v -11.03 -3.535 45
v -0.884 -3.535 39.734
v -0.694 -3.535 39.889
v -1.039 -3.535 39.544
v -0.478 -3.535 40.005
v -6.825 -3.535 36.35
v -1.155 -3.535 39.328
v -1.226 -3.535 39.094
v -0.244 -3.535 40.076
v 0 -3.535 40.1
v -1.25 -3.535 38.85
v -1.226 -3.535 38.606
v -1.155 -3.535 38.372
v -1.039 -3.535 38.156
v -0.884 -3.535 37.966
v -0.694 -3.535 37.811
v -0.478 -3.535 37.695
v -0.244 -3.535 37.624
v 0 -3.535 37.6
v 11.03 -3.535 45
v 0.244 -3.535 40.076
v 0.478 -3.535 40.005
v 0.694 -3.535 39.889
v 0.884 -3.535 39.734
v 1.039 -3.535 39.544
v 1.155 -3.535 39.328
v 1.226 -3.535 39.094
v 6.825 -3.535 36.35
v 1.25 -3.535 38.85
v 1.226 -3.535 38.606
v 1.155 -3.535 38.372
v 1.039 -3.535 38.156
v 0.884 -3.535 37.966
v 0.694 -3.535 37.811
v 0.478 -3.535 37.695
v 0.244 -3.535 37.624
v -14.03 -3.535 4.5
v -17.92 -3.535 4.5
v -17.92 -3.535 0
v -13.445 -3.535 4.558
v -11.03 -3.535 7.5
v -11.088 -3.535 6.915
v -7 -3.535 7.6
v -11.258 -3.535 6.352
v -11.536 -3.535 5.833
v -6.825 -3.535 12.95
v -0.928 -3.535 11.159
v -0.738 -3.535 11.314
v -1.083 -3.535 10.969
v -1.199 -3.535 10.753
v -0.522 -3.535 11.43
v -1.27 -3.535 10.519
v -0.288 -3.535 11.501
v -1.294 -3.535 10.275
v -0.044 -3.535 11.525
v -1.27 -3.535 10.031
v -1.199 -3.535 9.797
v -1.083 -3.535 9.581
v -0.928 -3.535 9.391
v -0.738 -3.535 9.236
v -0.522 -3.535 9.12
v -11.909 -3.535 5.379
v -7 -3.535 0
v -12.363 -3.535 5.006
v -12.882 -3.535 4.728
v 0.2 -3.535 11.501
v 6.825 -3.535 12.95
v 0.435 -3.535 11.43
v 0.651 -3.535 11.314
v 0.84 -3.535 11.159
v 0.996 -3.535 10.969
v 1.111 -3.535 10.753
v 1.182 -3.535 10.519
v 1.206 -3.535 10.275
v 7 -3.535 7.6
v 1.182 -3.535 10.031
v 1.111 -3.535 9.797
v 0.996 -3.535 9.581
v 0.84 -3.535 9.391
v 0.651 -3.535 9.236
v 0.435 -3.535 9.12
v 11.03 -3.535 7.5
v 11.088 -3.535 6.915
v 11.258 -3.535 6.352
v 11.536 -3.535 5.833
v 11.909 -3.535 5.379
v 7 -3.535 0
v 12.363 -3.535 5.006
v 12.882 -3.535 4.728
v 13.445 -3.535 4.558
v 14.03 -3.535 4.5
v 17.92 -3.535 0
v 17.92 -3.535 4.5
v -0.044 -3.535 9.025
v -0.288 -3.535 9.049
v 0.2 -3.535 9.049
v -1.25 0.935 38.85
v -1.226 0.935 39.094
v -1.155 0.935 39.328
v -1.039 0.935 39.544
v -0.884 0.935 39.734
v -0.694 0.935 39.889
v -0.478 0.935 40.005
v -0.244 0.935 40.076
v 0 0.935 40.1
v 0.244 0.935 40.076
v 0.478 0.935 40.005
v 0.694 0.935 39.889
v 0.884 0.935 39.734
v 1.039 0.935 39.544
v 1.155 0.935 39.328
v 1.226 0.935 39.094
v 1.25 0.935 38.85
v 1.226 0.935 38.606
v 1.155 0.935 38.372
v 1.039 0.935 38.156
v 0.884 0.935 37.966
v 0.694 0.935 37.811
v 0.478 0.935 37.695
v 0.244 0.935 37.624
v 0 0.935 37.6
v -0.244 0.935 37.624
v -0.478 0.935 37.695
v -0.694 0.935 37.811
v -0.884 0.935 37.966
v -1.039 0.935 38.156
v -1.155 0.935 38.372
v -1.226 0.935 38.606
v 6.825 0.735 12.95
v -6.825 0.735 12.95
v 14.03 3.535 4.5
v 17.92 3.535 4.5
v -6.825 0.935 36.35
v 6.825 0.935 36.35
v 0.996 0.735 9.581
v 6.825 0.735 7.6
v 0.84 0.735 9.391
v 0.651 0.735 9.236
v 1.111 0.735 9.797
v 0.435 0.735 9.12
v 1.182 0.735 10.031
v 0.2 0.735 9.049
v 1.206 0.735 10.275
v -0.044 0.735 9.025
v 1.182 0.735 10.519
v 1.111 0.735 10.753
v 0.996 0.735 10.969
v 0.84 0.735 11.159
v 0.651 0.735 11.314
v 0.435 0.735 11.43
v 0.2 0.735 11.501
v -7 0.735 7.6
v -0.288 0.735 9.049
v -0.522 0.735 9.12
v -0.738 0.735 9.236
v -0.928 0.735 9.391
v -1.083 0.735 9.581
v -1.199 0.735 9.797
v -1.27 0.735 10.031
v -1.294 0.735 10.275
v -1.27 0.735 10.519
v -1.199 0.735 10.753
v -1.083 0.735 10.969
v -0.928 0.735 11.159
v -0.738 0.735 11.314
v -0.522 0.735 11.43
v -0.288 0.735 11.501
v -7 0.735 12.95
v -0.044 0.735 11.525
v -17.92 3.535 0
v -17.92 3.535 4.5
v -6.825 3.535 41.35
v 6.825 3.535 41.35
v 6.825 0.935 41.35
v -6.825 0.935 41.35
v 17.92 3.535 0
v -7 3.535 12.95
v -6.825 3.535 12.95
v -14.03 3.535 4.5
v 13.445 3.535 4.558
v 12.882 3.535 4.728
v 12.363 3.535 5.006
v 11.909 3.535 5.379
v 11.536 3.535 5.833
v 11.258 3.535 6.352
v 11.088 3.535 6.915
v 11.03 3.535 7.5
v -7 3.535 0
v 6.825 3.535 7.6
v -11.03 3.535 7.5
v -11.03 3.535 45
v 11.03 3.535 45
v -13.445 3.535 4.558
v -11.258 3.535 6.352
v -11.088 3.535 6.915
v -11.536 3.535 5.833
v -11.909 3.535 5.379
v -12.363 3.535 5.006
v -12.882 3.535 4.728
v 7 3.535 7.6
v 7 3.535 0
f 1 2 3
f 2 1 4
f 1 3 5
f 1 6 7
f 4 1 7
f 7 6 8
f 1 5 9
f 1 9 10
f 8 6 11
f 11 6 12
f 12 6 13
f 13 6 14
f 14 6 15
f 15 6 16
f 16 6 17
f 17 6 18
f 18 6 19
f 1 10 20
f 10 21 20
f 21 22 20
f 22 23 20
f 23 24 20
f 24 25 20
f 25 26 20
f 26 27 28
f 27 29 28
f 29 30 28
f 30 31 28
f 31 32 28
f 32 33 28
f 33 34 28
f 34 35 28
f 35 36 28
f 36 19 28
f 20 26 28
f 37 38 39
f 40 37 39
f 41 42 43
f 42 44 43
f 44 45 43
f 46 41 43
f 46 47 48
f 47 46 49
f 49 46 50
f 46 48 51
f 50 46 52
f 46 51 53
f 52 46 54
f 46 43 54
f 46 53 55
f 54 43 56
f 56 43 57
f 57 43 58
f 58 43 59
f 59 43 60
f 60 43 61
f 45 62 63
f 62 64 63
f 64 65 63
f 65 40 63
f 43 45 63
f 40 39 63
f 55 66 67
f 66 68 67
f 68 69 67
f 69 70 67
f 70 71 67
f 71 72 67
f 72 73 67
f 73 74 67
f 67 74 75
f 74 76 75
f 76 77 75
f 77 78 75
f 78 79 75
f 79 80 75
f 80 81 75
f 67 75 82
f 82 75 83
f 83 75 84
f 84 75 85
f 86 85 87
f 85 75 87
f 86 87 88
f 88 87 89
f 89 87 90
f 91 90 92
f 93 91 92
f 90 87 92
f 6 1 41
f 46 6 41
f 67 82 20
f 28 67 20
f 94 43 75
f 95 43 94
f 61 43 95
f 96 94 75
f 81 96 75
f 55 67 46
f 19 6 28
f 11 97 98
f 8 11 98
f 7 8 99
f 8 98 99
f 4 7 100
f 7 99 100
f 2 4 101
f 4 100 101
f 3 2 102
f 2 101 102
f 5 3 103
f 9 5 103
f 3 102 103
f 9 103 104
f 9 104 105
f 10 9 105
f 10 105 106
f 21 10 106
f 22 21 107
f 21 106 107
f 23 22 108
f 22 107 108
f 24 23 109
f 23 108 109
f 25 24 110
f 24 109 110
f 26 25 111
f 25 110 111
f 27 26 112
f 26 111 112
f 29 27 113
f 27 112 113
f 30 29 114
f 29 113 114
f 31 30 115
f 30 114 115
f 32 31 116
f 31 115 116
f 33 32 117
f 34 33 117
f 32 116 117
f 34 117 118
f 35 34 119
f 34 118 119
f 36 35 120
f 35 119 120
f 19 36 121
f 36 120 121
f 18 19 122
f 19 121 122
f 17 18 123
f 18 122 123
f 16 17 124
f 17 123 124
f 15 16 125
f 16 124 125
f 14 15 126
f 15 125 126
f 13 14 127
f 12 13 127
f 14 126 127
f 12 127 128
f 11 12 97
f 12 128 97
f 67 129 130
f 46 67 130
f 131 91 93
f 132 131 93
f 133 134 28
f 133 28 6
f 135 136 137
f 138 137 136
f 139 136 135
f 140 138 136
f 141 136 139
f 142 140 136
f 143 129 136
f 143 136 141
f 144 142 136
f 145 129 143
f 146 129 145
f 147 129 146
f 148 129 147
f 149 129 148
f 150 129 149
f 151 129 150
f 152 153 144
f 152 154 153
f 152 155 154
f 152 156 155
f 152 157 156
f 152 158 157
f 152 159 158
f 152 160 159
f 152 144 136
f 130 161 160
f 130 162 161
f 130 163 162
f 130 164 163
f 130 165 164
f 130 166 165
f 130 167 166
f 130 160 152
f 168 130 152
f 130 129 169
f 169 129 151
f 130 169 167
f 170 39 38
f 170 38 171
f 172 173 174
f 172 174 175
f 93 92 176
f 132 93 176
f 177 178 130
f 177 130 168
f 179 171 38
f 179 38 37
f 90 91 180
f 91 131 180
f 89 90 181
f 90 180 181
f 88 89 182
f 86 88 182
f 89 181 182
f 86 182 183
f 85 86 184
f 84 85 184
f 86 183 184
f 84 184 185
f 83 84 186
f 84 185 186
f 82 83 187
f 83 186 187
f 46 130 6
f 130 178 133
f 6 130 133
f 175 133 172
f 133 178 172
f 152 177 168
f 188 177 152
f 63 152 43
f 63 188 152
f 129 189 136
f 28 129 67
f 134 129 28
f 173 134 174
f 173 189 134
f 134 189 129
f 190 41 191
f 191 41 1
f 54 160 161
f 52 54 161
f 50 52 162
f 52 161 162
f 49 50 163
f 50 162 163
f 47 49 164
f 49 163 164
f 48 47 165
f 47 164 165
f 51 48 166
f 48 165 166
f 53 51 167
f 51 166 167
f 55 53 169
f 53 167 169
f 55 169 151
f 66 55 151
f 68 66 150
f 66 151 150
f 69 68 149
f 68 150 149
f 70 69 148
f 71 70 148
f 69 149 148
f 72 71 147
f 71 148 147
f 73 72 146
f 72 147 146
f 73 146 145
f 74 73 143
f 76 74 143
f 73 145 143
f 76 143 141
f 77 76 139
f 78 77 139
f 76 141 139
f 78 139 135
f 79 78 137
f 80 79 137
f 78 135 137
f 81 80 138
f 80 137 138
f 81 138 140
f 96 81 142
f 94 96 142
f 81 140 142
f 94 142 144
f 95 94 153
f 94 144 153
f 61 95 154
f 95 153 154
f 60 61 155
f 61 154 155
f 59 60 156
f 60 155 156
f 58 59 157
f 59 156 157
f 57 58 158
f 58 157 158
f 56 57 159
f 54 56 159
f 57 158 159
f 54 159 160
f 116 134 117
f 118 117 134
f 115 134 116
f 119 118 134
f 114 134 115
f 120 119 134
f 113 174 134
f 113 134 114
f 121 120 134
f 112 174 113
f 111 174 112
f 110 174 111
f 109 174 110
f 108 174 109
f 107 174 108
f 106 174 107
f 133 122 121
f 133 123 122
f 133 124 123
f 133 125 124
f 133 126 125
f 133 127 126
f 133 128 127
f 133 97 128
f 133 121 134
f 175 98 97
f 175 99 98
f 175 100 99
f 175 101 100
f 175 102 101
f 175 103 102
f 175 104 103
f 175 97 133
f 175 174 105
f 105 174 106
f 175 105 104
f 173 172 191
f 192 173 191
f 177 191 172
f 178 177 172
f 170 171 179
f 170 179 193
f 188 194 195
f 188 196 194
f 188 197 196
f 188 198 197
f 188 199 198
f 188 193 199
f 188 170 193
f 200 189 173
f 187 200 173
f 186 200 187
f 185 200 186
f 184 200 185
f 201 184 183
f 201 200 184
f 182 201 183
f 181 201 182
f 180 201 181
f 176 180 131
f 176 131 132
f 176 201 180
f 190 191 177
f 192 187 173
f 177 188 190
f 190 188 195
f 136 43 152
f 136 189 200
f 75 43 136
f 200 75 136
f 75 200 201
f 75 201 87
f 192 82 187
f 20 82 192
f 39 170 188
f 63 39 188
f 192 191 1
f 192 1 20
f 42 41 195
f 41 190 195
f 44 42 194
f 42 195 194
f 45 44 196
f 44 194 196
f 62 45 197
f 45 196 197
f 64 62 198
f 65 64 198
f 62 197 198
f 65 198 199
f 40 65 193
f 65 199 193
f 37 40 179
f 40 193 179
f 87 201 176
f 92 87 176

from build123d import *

# Parameters (mm, degrees)
F0_W      = 35.84
F0_H      = 7.07
F1_DEPTH  = 45
F4_W      = 6.89
F4_H      = 40.5
F5_DEPTH  = 7.07
F6_W      = 6.89
F6_H      = 40.5
F7_DEPTH  = 7.07
F2_W      = 14
F2_H      = 7.07
F9_DEPTH  = 7.6
F10_W     = 13.65
F10_H     = 23.4
F11_DEPTH = 7.07
F12_W     = 13.65
F12_H     = 5
F13_DEPTH = 2.6
F14_W     = 13.825
F14_H     = 5.35
F15_DEPTH = 2.8
F16_R     = 3
F17_R     = 1.25
F18_DEPTH = 4.27
F19_R     = 1.25
F20_DEPTH = 4.47


with BuildPart() as f1:
    # F0 (on Top) → F1 (new body)
    with BuildSketch(Plane.XY):
        Rectangle(F0_W, F0_H)
    extrude(amount=F1_DEPTH)

    # F4 (on face) → F5 (cut, through all)
    with BuildSketch(Plane.XZ.offset(3.535)):
        with Locations((14.475, 24.75)):
            Rectangle(F4_W, F4_H)
    extrude(amount=-F5_DEPTH, mode=Mode.SUBTRACT)

    # F6 (on face) → F7 (cut, through all)
    with BuildSketch(Plane.XZ.offset(3.535)):
        with Locations((-14.475, 24.75)):
            Rectangle(F6_W, F6_H)
    extrude(amount=-F7_DEPTH, mode=Mode.SUBTRACT)

    # F2 (on face) → F9 (cut)
    with BuildSketch(Plane(origin=(0, 0, 0), x_dir=(1, 0, 0), z_dir=(0, 0, -1))):
        Rectangle(F2_W, F2_H)
    extrude(amount=-F9_DEPTH, mode=Mode.SUBTRACT)

    # F10 (on face) → F11 (cut, through all)
    with BuildSketch(Plane(origin=(0, 3.535, 0), x_dir=(-1, 0, 0), z_dir=(0, 1, 0))):
        with Locations((0, 24.65)):
            Rectangle(F10_W, F10_H)
    extrude(amount=-F11_DEPTH, mode=Mode.SUBTRACT)

    # F12 (on face) → F13 (cut)
    with BuildSketch(Plane(origin=(0, 3.535, 0), x_dir=(-1, 0, 0), z_dir=(0, 1, 0))):
        with Locations((0, 38.85)):
            Rectangle(F12_W, F12_H)
    extrude(amount=-F13_DEPTH, mode=Mode.SUBTRACT)

    # F14 (on face) → F15 (cut)
    with BuildSketch(Plane(origin=(0, 3.535, 0), x_dir=(-1, 0, 0), z_dir=(0, 1, 0))):
        with Locations((0.0875, 10.275)):
            Rectangle(F14_W, F14_H)
    extrude(amount=-F15_DEPTH, mode=Mode.SUBTRACT)

    # F16
    f16_edges = [f1.edges().sort_by_distance(p)[0] for p in [
        (-11.03, 0, 4.5),
        (11.03, 0, 4.5),
    ]]
    fillet(f16_edges, radius=F16_R)

    # F17 (on face) → F18 (cut, through all)
    with BuildSketch(Plane(origin=(0, 0.735, 0), x_dir=(-1, 0, 0), z_dir=(0, 1, 0))):
        with Locations((0.04375, 10.275)):
            Circle(F17_R)
    extrude(amount=-F18_DEPTH, mode=Mode.SUBTRACT)

    # F19 (on face) → F20 (cut, through all)
    with BuildSketch(Plane(origin=(0, 0.935, 0), x_dir=(-1, 0, 0), z_dir=(0, 1, 0))):
        with Locations((0, 38.85)):
            Circle(F19_R)
    extrude(amount=-F20_DEPTH, mode=Mode.SUBTRACT)


solid = f1.part
